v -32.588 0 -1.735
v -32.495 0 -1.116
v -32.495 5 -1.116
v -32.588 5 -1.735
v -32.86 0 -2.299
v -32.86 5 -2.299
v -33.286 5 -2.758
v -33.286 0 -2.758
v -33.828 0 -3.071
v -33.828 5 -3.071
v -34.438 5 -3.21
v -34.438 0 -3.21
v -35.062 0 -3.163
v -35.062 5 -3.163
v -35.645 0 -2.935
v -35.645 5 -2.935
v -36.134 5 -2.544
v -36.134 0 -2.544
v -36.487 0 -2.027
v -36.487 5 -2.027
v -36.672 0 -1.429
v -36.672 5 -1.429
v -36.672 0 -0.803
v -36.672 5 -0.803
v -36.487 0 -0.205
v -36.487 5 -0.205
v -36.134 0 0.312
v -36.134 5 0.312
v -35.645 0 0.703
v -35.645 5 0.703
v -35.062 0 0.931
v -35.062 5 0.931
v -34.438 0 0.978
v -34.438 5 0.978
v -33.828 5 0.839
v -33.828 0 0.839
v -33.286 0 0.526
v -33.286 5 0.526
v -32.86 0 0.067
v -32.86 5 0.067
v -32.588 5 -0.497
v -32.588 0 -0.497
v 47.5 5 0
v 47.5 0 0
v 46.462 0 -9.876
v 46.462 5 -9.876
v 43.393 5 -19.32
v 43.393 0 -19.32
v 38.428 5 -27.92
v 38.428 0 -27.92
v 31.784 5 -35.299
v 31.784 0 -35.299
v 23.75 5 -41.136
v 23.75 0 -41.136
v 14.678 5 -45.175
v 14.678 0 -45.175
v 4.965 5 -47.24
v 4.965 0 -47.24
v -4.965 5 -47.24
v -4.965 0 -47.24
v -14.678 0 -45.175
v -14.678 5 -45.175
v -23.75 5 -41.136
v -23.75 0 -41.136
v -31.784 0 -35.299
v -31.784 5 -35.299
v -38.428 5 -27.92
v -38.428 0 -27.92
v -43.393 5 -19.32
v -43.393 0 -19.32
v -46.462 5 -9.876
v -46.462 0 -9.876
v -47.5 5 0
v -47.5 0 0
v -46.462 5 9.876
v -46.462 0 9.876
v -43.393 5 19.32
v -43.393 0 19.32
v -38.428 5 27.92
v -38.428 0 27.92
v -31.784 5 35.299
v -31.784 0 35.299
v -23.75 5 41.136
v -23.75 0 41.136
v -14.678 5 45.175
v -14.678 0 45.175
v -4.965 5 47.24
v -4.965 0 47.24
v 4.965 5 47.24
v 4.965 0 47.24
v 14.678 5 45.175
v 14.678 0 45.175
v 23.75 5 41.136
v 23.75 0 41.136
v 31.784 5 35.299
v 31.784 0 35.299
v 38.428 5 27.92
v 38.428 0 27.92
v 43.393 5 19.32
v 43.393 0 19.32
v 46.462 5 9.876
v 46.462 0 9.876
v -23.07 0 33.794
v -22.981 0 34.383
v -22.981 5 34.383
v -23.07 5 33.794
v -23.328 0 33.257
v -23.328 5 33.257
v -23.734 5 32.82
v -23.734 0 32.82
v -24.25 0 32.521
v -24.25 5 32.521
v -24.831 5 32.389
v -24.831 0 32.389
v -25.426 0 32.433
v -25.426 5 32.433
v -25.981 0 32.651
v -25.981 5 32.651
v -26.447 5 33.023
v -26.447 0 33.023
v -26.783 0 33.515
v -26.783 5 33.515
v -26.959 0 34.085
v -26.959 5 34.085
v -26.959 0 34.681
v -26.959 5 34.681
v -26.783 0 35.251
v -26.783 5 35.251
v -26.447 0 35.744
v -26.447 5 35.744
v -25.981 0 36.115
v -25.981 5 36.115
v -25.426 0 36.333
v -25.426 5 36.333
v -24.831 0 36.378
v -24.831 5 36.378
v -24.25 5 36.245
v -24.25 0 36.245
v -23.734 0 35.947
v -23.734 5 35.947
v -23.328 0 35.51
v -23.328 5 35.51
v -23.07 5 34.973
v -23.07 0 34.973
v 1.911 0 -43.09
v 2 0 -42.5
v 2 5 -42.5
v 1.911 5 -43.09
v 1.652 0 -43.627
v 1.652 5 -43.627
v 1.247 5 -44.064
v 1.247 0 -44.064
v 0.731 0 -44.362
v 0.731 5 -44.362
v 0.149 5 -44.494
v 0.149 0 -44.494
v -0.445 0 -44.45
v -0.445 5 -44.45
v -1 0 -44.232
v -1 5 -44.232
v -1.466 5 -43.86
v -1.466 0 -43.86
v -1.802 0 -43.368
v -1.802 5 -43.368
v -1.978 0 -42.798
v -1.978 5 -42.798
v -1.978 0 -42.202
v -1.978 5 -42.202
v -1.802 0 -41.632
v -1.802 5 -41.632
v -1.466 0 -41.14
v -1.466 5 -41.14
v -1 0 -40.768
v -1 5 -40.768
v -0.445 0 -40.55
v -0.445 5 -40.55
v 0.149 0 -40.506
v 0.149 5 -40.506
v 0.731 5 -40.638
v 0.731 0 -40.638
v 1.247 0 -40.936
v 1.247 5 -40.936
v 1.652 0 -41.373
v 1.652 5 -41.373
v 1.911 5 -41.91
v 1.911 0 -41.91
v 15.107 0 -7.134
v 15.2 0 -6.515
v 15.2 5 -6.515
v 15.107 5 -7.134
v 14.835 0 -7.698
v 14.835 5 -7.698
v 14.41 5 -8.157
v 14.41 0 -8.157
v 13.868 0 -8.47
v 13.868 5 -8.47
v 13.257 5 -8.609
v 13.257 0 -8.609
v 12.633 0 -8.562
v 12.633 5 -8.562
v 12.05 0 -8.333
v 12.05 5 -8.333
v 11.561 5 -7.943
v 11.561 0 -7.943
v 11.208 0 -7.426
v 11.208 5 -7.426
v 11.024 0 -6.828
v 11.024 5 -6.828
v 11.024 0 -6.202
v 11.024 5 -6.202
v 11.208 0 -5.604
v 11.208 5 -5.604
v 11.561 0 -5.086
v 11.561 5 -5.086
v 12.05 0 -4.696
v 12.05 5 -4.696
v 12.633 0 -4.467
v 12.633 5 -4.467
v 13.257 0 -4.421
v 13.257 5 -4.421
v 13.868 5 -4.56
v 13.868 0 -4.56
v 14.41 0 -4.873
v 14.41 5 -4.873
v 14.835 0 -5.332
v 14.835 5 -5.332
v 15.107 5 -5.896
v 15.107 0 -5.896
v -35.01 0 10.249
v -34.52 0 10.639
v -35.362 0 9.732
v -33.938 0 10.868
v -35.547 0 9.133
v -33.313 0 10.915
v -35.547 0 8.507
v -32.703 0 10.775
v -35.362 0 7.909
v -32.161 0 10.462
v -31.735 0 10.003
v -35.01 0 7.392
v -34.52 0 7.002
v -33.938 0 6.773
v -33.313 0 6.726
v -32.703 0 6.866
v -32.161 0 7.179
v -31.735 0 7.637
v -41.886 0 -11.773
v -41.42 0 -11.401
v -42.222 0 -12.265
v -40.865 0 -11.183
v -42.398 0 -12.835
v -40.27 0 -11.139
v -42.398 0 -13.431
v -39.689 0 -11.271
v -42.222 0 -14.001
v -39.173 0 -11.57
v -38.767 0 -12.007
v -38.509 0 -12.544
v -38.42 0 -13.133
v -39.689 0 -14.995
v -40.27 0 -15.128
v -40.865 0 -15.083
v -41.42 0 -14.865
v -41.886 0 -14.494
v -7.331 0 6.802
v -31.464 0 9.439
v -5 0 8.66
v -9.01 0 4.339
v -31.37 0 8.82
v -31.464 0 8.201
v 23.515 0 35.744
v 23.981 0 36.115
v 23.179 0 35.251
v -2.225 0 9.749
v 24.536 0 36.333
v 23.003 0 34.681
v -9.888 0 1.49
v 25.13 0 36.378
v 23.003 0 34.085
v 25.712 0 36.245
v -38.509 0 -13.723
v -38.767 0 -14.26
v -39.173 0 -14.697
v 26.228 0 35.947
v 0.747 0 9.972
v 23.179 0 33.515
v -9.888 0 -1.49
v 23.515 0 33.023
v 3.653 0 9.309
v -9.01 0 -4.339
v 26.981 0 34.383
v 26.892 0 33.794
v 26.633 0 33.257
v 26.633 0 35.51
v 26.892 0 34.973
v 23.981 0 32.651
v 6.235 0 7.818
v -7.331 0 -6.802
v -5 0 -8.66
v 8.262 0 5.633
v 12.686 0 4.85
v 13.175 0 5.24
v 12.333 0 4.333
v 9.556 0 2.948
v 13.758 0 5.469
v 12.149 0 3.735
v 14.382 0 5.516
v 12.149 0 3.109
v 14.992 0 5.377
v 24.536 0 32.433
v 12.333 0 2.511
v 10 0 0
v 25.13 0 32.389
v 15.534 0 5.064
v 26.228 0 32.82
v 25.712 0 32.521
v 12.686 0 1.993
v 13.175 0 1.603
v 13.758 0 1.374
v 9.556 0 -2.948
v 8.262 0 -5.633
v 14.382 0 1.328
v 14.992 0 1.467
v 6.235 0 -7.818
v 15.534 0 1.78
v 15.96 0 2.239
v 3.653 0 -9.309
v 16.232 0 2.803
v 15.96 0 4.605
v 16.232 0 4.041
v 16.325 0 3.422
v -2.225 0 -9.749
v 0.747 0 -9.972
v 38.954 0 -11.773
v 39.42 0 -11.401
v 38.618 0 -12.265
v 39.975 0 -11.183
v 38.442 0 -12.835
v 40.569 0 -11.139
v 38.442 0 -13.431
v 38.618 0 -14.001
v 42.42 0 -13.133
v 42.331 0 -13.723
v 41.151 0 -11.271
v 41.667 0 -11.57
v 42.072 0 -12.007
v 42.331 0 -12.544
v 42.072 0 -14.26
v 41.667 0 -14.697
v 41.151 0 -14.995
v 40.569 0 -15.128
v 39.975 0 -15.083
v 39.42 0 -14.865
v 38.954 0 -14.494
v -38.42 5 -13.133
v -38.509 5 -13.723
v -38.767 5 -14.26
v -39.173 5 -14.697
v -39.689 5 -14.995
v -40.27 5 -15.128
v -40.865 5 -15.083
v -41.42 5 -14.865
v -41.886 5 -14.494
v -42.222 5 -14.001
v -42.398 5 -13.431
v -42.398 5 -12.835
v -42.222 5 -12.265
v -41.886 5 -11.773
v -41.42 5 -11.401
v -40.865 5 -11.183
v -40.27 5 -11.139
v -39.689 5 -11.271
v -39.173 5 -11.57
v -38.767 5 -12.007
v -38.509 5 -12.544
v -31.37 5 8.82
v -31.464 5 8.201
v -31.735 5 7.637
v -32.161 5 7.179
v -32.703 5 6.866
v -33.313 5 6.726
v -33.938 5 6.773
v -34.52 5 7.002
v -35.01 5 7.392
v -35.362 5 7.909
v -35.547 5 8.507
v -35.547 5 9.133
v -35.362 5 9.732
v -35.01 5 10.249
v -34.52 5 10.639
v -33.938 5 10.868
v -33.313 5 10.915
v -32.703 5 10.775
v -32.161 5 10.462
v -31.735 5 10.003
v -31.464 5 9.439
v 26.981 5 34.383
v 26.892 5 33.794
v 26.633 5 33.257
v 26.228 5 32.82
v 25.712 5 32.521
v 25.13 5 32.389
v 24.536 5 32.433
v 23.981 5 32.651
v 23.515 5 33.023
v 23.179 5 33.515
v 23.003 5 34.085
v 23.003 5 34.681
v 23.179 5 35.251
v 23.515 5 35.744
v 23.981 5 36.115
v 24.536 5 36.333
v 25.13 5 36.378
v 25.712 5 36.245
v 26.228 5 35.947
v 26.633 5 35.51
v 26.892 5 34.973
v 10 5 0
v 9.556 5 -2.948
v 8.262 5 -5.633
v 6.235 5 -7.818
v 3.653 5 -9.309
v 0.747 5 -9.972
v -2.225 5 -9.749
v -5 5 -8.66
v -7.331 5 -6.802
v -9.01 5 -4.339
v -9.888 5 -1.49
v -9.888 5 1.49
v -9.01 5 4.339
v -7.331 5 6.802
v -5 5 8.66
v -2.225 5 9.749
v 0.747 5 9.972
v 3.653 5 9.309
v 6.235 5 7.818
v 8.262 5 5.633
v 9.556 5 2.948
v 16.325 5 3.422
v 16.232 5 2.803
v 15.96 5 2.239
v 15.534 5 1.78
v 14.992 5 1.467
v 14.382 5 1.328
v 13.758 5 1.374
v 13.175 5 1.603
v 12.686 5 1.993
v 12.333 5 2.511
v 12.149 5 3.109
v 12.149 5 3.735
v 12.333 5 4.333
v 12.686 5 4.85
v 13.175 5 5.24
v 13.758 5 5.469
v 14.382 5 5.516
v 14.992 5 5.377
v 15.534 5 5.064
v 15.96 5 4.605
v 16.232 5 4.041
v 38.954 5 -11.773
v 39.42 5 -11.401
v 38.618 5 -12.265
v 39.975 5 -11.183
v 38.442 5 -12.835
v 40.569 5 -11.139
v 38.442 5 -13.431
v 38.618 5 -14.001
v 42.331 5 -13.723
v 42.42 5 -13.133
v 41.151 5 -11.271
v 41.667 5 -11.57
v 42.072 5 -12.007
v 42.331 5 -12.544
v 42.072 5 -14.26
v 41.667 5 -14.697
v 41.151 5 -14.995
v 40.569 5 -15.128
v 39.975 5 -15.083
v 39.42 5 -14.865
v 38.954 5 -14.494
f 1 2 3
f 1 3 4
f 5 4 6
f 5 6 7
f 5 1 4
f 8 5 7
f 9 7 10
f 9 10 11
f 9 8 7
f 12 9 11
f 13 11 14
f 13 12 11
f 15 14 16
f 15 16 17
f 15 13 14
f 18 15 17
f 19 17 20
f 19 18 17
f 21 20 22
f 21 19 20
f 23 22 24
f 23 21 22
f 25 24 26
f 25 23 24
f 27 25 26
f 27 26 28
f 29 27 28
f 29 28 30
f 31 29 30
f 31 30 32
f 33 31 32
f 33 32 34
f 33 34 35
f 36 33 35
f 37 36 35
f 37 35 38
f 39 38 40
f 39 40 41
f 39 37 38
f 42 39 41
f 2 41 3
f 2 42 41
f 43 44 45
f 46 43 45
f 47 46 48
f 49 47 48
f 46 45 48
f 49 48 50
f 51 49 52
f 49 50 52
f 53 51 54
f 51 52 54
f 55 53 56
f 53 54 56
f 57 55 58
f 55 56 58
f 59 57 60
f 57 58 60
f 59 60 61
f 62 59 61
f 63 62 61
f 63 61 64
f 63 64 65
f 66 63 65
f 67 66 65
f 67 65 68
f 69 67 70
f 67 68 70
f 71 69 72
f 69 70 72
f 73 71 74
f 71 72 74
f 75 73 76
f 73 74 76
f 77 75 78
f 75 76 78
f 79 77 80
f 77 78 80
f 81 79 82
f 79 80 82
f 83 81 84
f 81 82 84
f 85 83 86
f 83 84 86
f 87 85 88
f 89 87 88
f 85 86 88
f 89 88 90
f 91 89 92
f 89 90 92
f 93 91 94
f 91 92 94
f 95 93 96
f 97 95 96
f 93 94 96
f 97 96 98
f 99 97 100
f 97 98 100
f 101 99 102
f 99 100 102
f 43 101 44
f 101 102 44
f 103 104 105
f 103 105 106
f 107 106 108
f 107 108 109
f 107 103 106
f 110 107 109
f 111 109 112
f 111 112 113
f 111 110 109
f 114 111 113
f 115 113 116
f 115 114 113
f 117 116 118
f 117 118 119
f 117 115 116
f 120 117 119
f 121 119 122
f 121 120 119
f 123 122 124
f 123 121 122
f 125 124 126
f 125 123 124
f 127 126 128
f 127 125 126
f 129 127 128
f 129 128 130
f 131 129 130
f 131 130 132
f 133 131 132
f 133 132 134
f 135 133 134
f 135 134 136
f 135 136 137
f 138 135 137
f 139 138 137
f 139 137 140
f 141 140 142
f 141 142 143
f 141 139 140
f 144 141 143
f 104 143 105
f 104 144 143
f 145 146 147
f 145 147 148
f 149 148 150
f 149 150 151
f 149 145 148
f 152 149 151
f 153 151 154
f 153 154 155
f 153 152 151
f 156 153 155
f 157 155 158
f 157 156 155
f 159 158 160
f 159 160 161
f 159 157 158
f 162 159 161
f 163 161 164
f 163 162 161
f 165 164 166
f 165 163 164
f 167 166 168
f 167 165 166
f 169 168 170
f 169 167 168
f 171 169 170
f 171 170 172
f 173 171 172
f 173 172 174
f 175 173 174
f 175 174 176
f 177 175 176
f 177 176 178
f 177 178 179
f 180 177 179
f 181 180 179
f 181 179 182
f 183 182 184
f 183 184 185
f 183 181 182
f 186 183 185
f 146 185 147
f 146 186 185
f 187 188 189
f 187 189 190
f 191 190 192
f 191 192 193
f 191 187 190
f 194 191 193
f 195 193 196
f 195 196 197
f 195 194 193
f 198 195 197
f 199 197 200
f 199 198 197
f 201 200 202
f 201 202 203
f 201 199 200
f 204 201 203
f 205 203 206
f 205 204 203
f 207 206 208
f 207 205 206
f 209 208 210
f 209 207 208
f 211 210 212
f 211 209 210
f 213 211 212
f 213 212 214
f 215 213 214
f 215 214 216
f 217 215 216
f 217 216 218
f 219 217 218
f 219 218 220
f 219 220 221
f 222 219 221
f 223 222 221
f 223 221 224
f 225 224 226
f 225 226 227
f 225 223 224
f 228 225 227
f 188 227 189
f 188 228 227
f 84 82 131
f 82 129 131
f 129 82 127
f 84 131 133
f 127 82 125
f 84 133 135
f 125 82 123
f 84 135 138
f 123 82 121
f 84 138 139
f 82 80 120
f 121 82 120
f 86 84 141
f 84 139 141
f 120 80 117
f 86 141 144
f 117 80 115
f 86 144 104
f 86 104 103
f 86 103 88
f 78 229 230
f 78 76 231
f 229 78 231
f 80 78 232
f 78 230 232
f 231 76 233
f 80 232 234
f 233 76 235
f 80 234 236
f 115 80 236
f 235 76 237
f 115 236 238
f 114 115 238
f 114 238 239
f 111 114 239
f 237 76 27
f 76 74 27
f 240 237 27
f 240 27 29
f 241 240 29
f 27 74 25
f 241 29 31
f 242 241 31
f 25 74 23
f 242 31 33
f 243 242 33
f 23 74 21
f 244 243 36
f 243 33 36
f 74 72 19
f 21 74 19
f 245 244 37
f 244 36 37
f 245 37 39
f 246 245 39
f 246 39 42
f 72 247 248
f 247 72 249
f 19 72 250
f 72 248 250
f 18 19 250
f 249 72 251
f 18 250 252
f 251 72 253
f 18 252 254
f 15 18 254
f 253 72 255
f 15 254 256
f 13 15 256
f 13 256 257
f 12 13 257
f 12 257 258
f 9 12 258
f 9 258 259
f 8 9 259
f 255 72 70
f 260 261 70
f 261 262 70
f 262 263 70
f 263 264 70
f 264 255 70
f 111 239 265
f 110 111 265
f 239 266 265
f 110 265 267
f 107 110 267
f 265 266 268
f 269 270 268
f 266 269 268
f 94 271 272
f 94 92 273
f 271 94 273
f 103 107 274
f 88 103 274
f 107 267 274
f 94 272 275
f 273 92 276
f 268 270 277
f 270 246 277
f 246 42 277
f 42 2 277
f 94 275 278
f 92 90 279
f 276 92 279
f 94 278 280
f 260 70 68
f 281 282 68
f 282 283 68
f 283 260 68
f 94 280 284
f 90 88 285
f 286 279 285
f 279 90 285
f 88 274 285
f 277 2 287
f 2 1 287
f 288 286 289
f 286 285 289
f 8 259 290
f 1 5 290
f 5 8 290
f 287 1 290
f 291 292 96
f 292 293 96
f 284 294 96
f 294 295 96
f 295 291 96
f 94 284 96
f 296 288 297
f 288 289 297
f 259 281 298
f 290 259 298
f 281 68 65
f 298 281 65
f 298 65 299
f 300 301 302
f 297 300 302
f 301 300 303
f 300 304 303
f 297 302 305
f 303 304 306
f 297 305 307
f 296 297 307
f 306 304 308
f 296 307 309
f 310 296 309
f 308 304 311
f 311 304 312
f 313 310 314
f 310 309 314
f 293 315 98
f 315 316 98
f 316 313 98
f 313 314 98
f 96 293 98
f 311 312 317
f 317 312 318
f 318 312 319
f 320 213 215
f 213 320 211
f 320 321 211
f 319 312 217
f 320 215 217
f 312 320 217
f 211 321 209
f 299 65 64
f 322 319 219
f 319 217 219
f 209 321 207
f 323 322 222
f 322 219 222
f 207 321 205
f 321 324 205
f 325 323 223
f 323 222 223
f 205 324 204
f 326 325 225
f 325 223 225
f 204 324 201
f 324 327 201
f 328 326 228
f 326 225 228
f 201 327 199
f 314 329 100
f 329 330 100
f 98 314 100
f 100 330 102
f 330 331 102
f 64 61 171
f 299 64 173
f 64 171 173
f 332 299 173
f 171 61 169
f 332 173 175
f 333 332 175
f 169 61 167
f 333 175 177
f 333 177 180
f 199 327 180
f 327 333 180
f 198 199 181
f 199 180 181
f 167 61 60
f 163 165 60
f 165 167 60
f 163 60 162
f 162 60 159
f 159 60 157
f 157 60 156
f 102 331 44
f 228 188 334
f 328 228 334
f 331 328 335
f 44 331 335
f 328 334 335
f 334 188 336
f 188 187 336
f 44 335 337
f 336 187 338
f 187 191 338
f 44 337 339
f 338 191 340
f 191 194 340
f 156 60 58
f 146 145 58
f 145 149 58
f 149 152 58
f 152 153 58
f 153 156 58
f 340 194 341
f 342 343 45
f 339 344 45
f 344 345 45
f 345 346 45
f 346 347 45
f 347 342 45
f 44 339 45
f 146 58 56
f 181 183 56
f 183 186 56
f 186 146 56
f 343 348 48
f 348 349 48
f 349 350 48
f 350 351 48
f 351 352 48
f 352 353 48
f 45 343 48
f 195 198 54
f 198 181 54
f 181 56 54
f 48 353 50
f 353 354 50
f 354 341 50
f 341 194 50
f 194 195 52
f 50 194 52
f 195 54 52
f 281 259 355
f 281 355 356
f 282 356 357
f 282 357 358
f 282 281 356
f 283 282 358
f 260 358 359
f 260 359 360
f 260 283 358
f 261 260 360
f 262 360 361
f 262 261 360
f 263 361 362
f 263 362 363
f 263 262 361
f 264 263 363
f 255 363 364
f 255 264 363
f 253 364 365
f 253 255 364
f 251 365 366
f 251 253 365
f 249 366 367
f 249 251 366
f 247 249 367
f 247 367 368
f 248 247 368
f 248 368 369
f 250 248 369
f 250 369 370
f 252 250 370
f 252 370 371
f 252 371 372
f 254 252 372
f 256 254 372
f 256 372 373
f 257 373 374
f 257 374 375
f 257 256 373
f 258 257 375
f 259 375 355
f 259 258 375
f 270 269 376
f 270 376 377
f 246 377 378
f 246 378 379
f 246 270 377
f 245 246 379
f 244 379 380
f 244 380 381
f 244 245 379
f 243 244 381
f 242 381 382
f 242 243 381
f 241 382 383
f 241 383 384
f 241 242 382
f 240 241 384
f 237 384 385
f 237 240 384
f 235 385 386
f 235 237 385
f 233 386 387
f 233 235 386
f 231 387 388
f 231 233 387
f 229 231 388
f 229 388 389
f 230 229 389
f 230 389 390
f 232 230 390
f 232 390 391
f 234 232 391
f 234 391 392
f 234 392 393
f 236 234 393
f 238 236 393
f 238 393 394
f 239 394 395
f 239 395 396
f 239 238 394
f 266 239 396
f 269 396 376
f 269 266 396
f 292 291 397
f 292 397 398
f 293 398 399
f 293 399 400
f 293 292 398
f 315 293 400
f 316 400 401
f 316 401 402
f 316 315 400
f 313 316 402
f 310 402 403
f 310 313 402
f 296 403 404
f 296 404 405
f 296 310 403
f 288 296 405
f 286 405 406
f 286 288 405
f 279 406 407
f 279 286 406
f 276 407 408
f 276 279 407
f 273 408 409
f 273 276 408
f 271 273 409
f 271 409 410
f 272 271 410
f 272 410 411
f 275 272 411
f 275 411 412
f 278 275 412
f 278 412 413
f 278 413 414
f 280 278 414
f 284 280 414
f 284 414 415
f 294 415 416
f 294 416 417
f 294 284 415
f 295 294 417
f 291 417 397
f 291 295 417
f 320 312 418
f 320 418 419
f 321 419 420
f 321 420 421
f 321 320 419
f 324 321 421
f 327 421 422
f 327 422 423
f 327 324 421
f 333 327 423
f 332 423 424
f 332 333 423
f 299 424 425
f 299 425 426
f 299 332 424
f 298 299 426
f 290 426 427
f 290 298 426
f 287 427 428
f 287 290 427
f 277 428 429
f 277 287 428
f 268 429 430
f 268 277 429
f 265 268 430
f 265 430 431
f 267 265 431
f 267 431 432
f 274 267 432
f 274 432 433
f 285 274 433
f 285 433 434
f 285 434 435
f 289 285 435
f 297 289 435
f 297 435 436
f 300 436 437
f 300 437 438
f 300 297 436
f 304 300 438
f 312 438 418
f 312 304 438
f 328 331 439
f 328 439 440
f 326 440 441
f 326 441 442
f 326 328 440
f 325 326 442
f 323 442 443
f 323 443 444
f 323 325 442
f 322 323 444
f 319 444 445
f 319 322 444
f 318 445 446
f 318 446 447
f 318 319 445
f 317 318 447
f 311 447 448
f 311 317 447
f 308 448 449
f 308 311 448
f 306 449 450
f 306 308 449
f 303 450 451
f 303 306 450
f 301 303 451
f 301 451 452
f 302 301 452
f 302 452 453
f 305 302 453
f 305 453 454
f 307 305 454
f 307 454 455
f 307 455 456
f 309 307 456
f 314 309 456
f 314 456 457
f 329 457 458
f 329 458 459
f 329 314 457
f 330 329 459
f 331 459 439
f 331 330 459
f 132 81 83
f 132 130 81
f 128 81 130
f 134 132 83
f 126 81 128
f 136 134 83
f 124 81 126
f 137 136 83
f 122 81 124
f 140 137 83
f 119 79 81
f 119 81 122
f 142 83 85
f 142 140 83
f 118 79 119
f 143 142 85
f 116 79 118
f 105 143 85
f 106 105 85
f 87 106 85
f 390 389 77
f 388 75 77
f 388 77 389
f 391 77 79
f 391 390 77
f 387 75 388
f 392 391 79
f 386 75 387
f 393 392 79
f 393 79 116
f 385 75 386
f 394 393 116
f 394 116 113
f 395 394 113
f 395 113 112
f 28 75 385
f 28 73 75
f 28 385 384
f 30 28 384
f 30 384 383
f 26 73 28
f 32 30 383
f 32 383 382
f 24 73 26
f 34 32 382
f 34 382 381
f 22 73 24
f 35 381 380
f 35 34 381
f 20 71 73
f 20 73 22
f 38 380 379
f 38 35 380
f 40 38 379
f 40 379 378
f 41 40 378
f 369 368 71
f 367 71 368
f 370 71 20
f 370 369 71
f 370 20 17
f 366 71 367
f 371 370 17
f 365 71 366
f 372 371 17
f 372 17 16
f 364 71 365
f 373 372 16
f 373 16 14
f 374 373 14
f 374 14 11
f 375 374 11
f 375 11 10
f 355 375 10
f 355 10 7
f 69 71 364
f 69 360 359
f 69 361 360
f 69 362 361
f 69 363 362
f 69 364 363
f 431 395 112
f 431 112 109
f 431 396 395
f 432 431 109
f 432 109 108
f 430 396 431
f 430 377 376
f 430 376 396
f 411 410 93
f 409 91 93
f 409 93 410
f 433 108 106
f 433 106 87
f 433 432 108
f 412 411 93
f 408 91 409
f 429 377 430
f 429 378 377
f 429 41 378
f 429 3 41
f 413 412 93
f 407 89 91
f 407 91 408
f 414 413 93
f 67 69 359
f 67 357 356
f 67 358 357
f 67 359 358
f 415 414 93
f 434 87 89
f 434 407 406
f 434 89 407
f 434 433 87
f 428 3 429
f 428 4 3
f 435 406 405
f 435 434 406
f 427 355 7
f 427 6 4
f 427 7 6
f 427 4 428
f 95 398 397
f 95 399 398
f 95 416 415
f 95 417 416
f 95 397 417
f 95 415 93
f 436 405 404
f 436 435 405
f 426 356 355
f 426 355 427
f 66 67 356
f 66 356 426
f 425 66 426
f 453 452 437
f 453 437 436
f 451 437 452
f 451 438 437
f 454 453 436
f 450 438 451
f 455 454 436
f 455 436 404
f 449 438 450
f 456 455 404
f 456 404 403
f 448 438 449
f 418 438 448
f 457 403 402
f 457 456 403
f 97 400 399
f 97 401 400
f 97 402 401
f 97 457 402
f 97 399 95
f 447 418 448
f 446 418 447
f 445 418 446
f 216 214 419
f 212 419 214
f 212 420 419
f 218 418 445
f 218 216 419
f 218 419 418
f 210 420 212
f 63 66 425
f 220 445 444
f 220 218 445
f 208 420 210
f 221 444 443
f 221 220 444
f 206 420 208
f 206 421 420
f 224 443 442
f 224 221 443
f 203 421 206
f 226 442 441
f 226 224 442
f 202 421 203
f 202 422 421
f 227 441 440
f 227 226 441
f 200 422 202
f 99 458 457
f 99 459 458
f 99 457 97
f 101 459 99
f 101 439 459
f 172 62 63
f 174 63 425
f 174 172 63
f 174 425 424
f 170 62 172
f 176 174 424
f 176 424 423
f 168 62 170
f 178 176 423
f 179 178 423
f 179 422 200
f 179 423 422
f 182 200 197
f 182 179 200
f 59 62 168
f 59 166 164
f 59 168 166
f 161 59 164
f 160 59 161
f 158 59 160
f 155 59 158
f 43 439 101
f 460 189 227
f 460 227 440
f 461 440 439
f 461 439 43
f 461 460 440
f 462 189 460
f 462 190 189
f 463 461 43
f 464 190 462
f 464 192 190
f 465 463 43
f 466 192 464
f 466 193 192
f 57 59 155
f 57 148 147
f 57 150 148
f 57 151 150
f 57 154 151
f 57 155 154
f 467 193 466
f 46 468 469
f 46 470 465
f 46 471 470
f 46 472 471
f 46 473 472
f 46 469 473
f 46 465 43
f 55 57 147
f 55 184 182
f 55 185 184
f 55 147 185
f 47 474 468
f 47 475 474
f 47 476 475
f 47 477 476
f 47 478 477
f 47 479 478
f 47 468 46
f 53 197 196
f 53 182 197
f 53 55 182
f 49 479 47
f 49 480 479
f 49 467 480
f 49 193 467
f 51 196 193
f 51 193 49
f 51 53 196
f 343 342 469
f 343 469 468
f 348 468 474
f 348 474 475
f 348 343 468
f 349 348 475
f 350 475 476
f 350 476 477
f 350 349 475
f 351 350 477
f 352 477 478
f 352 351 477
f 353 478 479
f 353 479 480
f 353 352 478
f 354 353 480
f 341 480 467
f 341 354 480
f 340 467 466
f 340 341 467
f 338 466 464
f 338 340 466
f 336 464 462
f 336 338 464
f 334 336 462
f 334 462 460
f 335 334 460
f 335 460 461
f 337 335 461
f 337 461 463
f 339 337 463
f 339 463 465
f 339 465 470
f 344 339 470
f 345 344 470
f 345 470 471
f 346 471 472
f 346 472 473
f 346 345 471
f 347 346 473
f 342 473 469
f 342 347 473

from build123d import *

# Parameters (mm, degrees)
SKETCH1_R           = 47.5
SKETCH1_R_2         = 2
SKETCH1_R_3         = 10
SKETCH1_R_4         = 2.1
BOSS_EXTRUDE1_DEPTH = 5


with BuildPart() as part:
    # Sketch1 → Boss-Extrude1 (new body)
    with BuildSketch(Plane(origin=(0, 0, 0), x_dir=(1, 0, 0), z_dir=(0, 1, 0))):
        Circle(SKETCH1_R)
        with Locations((0, 42.5)):
            Circle(SKETCH1_R_2, mode=Mode.SUBTRACT)
        with Locations((40.419901943, 13.133222261)):
            Circle(SKETCH1_R_2, mode=Mode.SUBTRACT)
        with Locations((24.980873222, -34.383222261)):
            Circle(SKETCH1_R_2, mode=Mode.SUBTRACT)
        with Locations((-24.980873222, -34.383222261)):
            Circle(SKETCH1_R_2, mode=Mode.SUBTRACT)
        with Locations((-40.419901943, 13.133222261)):
            Circle(SKETCH1_R_2, mode=Mode.SUBTRACT)
        Circle(SKETCH1_R_3, mode=Mode.SUBTRACT)
        with Locations((-34.595040144, 1.116108173)):
            Circle(SKETCH1_R_4, mode=Mode.SUBTRACT)
        with Locations((14.225114828, -3.421784349)):
            Circle(SKETCH1_R_4, mode=Mode.SUBTRACT)
        with Locations((-33.470320058, -8.820440761)):
            Circle(SKETCH1_R_4, mode=Mode.SUBTRACT)
        with Locations((13.100394742, 6.514764585)):
            Circle(SKETCH1_R_4, mode=Mode.SUBTRACT)
    extrude(amount=BOSS_EXTRUDE1_DEPTH)


solid = part.part
